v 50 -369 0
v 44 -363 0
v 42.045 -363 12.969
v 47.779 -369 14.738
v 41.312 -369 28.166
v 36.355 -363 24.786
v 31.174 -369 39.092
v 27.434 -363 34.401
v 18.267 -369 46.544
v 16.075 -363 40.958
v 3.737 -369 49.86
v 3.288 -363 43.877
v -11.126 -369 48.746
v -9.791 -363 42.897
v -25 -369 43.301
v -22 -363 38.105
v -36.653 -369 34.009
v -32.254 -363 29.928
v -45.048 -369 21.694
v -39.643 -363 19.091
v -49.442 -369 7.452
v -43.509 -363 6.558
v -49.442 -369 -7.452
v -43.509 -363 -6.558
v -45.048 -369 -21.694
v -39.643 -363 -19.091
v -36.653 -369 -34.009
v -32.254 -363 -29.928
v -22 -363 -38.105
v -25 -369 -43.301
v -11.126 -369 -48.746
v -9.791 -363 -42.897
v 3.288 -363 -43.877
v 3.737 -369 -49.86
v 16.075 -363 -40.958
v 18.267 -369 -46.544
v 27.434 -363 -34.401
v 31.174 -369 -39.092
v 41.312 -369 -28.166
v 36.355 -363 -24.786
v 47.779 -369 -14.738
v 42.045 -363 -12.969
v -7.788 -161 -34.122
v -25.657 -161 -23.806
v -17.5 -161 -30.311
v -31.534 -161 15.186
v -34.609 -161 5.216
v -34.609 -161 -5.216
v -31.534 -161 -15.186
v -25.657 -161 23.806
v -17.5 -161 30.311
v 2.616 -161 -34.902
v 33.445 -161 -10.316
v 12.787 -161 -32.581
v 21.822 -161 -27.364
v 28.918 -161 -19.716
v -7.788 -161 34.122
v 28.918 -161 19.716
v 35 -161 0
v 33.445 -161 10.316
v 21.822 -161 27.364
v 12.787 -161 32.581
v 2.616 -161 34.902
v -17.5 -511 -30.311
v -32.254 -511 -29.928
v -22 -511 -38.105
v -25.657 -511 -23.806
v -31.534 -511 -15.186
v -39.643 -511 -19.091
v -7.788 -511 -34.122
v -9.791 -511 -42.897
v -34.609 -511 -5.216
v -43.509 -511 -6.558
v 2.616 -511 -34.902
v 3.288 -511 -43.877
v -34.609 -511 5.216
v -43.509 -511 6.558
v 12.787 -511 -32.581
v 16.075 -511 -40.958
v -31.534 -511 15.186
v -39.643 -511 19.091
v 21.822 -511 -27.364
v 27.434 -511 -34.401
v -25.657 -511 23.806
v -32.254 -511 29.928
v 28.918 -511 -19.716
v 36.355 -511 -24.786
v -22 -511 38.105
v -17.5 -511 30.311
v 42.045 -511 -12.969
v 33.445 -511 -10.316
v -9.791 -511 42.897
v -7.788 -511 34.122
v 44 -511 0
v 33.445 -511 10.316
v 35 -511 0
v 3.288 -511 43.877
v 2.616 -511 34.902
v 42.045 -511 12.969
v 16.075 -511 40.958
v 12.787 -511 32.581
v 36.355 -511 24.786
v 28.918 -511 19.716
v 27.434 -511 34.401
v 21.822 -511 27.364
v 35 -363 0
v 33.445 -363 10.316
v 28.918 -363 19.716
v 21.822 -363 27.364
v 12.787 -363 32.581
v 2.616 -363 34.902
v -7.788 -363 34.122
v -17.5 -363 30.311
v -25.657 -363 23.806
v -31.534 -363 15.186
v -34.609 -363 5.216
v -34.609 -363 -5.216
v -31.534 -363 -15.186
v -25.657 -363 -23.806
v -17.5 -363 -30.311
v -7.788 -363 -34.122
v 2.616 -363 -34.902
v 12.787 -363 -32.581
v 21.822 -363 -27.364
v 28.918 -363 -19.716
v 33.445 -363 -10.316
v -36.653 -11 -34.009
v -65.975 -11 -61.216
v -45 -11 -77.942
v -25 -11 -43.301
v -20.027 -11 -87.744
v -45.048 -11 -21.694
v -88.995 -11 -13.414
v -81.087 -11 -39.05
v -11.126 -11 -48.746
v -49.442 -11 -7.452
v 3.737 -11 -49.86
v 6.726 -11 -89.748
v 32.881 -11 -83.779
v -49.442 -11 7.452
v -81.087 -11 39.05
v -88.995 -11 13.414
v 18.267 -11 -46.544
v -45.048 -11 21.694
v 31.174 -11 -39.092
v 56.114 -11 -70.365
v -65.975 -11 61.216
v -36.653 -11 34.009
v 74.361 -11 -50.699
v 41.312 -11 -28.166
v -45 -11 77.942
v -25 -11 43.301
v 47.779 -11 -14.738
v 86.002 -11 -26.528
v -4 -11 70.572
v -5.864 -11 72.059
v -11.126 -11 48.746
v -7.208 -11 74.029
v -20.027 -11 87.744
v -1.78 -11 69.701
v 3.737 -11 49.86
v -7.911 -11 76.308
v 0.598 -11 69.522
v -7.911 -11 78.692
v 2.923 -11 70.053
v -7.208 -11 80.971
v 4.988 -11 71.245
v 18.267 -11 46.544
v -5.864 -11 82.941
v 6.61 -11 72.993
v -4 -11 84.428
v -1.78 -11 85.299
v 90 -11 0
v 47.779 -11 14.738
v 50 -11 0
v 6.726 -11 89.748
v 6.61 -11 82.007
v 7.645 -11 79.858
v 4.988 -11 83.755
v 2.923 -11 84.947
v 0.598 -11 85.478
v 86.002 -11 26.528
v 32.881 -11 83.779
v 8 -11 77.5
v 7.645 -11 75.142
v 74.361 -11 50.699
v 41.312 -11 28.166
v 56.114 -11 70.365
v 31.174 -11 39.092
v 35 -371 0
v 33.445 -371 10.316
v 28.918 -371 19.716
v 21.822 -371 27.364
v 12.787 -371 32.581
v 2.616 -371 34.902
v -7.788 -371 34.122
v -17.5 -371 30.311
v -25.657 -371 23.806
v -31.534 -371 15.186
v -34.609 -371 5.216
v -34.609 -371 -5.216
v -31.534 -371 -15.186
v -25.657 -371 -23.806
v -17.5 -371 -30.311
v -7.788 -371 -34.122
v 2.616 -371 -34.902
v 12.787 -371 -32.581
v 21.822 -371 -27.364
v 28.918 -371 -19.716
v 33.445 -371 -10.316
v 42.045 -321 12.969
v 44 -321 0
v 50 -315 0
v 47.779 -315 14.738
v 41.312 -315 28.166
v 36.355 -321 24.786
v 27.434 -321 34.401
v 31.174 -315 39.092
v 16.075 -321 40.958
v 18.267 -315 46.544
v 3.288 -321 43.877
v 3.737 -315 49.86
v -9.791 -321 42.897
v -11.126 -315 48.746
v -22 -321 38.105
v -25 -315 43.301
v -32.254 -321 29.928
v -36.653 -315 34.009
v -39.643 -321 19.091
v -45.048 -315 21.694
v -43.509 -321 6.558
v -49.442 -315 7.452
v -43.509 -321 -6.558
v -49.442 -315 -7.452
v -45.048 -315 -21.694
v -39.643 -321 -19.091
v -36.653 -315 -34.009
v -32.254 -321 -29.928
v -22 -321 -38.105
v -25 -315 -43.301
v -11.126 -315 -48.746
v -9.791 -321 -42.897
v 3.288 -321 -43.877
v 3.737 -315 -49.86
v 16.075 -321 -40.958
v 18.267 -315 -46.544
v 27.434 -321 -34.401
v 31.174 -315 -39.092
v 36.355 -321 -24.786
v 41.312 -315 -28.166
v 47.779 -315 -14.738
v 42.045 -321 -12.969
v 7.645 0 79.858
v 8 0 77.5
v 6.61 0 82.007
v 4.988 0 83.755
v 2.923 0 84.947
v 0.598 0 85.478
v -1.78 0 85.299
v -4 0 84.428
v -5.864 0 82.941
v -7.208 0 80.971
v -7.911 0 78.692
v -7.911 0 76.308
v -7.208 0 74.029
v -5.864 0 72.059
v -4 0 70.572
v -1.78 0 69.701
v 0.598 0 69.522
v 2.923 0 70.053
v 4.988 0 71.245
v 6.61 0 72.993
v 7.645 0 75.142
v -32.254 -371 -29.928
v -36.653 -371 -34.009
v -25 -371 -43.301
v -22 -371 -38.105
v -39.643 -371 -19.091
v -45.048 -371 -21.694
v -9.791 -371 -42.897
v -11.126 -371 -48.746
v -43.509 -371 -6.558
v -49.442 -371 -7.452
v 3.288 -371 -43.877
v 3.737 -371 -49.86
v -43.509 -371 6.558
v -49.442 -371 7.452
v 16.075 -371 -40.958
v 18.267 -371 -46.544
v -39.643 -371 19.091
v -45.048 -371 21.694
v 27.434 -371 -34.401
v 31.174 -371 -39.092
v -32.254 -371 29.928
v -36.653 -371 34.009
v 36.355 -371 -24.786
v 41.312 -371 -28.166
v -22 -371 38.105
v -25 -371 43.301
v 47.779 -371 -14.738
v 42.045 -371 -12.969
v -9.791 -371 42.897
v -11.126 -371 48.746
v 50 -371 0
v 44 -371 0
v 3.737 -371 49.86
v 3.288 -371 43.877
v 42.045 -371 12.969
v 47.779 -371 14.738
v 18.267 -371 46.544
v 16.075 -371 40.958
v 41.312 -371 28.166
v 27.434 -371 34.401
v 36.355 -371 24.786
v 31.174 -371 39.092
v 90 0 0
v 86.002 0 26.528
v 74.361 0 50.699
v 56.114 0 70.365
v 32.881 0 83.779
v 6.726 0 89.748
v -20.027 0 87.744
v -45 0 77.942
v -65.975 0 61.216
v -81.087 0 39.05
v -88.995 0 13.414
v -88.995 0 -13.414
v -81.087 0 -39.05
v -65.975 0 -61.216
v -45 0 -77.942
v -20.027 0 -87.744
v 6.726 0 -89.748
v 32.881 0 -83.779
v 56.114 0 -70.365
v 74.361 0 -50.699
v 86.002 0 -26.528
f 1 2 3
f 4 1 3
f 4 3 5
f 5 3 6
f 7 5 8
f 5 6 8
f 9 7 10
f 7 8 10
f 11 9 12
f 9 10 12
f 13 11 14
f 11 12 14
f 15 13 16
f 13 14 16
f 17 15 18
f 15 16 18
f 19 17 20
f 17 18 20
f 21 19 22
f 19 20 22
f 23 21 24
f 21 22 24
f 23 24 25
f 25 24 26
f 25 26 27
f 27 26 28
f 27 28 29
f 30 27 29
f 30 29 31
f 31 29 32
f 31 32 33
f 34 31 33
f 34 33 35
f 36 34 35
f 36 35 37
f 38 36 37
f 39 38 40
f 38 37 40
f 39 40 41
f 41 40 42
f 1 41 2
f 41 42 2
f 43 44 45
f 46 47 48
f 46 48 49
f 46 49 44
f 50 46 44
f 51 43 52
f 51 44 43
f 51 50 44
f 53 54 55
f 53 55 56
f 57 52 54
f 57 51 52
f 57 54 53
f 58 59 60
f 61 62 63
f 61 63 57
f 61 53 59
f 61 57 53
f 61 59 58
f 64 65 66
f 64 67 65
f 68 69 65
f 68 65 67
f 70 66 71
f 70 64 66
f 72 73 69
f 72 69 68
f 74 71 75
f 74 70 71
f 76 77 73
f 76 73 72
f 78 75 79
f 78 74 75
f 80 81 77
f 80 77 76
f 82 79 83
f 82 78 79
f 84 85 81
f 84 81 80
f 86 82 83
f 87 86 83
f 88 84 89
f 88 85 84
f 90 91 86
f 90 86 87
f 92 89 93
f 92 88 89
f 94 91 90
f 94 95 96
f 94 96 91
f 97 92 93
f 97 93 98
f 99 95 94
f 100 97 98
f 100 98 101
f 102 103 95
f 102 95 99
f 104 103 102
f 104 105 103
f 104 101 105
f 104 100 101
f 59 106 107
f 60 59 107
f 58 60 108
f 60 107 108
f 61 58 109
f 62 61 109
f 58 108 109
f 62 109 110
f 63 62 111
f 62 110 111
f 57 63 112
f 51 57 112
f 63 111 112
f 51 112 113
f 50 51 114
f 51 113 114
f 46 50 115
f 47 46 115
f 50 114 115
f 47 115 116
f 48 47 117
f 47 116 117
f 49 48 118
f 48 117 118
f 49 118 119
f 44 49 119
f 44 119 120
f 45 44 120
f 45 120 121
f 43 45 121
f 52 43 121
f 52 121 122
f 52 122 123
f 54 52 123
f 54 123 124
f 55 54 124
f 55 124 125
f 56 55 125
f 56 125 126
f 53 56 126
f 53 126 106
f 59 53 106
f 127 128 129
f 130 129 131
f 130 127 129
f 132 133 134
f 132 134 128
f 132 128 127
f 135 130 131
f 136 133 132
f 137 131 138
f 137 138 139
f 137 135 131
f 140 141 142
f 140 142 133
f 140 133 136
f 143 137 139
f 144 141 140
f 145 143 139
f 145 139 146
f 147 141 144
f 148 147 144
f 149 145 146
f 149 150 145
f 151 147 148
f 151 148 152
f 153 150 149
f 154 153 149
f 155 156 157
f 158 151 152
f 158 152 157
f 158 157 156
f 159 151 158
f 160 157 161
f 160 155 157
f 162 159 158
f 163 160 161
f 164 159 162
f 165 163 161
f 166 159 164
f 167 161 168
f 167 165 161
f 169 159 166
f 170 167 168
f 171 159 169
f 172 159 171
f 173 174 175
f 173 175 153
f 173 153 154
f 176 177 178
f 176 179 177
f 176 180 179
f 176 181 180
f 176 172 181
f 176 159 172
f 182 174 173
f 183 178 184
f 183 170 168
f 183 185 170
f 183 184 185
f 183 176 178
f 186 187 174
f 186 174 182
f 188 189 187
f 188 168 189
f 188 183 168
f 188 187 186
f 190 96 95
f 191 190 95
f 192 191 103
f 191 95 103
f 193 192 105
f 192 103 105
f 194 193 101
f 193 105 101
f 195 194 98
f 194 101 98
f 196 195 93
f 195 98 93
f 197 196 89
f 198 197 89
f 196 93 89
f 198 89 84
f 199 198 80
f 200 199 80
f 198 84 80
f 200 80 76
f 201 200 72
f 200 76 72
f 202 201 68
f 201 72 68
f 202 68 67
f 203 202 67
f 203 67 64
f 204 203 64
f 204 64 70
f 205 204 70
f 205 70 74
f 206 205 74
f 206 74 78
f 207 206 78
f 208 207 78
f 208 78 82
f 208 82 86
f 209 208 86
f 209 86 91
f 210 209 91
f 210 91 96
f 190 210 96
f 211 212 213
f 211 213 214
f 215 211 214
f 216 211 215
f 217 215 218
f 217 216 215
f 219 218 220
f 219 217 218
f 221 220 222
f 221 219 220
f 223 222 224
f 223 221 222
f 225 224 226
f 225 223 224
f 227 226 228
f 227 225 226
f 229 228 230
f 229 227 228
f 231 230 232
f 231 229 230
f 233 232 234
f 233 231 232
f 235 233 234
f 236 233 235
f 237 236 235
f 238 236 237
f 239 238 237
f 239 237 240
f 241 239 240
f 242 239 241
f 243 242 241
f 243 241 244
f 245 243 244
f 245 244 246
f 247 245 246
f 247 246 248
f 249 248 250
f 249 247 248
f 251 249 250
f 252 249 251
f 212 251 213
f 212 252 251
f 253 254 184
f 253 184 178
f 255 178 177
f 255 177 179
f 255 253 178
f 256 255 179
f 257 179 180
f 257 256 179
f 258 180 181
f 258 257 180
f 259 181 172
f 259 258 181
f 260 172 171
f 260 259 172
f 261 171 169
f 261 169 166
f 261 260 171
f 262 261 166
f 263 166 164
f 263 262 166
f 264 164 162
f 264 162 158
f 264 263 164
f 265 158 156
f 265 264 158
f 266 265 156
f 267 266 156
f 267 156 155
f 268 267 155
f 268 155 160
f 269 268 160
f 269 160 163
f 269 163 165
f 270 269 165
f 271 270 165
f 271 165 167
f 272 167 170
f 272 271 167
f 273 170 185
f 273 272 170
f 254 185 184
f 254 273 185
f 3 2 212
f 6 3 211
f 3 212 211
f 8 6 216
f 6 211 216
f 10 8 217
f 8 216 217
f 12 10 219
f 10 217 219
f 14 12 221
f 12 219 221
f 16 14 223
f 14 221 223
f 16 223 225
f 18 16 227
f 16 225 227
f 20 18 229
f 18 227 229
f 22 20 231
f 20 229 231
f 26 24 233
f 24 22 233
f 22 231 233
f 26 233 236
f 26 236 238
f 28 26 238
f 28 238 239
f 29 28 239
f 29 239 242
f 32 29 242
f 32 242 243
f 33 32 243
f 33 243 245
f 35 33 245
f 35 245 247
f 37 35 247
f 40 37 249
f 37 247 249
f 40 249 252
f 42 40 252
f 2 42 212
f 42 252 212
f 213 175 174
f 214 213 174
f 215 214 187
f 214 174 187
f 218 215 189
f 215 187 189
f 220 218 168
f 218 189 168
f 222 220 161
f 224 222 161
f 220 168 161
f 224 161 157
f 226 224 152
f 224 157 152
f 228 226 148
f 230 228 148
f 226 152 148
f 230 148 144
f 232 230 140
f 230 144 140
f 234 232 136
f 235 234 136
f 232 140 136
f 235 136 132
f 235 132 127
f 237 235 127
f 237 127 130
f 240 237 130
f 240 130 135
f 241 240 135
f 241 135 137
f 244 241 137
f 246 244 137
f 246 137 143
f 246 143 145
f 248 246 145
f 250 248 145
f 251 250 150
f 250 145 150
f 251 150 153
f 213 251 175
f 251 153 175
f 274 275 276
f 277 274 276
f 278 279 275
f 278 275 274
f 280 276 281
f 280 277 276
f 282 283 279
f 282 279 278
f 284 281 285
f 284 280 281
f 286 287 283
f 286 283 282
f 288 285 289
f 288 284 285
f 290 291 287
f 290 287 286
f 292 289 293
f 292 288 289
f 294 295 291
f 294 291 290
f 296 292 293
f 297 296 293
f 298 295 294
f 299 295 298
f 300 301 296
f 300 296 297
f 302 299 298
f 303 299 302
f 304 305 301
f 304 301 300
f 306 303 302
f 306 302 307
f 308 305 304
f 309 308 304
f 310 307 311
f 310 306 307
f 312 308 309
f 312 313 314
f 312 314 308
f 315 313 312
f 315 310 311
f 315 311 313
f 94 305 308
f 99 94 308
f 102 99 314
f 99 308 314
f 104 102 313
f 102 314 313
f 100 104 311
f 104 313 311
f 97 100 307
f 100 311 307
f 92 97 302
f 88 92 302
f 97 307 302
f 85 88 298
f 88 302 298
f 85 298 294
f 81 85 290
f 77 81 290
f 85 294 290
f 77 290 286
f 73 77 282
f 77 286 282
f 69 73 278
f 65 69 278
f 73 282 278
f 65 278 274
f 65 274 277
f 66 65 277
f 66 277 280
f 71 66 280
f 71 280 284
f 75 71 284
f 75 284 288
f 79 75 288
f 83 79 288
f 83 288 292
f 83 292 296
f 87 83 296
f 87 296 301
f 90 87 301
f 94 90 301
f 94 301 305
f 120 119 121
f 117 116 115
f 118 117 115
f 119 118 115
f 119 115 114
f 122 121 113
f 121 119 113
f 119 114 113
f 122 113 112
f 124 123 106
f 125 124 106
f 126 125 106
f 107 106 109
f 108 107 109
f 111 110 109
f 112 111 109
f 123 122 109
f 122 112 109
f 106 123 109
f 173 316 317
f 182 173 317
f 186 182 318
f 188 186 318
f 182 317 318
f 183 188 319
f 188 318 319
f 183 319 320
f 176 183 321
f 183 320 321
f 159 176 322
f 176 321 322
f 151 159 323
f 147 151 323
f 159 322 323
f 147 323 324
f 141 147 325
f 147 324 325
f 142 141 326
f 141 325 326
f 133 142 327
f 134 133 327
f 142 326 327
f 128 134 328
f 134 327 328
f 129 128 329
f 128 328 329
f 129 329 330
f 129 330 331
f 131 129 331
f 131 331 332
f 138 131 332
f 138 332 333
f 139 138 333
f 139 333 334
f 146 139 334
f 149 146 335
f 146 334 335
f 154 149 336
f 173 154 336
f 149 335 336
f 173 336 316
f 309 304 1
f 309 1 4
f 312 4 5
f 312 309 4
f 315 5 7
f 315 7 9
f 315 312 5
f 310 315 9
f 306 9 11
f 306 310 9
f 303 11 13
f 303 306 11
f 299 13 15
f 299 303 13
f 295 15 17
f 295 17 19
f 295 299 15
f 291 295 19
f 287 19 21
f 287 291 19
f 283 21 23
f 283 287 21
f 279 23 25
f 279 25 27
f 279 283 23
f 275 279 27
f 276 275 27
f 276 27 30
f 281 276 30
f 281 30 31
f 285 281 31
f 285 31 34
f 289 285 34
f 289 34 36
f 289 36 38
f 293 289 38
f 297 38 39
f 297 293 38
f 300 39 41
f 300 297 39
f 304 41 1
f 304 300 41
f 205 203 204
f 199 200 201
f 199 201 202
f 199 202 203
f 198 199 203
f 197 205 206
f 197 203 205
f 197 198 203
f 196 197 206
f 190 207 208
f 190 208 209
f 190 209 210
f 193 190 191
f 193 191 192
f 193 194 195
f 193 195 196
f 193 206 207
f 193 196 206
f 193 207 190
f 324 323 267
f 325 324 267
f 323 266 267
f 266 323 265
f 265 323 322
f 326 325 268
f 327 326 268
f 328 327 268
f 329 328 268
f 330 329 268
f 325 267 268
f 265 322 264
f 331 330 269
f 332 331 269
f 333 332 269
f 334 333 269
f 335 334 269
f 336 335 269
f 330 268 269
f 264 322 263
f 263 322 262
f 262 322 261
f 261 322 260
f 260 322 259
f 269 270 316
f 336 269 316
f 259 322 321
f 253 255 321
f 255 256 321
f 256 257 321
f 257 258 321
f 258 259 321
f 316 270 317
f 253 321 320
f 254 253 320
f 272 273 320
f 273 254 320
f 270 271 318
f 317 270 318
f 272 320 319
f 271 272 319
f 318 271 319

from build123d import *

# Parameters (mm, degrees)
F0_R      = 90
F0_R_2    = 8
F1_DEPTH  = 11
F2_R      = 50
F3_DEPTH  = 310
F4_R      = 44
F5_DEPTH  = 190
F6_R      = 35
F7_DEPTH  = 350
F8_SIZE   = 5.99999
F10_R     = 50
F11_DEPTH = 8
F12_SIZE  = 5.99999


# Not quite as in the source:
# - a fillet or chamfer is up to 0.001 mm smaller than in the source, because OpenCascade refuses the exact size


with BuildPart() as f1:
    # F0 (on Front) → F1 (new body)
    with BuildSketch(Plane.XZ):
        Circle(F0_R)
        with Locations((0, 77.5)):
            Circle(F0_R_2, mode=Mode.SUBTRACT)
    extrude(amount=F1_DEPTH)

    # F2 (on face) → F3 (join)
    with BuildSketch(Plane.XZ.offset(11)):
        Circle(F2_R)
    extrude(amount=F3_DEPTH)

    # F4 (on face) → F5 (join)
    with BuildSketch(Plane.XZ.offset(321)):
        Circle(F4_R)
    extrude(amount=F5_DEPTH)

    # F6 (on face) → F7 (cut)
    with BuildSketch(Plane.XZ.offset(511)):
        Circle(F6_R)
    extrude(amount=-F7_DEPTH, mode=Mode.SUBTRACT)

    # F8 (size 6 in the source; OpenCascade refuses exactly that, so slightly less here)
    f8_edges = [f1.edges().sort_by_distance(p)[0] for p in [
        (-50, -321, 0),
    ]]
    chamfer(f8_edges, length=F8_SIZE)

    # F10 (on offset) → F11 (join)
    with BuildSketch(Plane.XZ.offset(371)):
        Circle(F10_R)
    extrude(amount=-F11_DEPTH)

    # F12 (size 6 in the source; OpenCascade refuses exactly that, so slightly less here)
    f12_edges = [f1.edges().sort_by_distance(p)[0] for p in [
        (-50, -363, 0),
    ]]
    chamfer(f12_edges, length=F12_SIZE)


solid = f1.part
